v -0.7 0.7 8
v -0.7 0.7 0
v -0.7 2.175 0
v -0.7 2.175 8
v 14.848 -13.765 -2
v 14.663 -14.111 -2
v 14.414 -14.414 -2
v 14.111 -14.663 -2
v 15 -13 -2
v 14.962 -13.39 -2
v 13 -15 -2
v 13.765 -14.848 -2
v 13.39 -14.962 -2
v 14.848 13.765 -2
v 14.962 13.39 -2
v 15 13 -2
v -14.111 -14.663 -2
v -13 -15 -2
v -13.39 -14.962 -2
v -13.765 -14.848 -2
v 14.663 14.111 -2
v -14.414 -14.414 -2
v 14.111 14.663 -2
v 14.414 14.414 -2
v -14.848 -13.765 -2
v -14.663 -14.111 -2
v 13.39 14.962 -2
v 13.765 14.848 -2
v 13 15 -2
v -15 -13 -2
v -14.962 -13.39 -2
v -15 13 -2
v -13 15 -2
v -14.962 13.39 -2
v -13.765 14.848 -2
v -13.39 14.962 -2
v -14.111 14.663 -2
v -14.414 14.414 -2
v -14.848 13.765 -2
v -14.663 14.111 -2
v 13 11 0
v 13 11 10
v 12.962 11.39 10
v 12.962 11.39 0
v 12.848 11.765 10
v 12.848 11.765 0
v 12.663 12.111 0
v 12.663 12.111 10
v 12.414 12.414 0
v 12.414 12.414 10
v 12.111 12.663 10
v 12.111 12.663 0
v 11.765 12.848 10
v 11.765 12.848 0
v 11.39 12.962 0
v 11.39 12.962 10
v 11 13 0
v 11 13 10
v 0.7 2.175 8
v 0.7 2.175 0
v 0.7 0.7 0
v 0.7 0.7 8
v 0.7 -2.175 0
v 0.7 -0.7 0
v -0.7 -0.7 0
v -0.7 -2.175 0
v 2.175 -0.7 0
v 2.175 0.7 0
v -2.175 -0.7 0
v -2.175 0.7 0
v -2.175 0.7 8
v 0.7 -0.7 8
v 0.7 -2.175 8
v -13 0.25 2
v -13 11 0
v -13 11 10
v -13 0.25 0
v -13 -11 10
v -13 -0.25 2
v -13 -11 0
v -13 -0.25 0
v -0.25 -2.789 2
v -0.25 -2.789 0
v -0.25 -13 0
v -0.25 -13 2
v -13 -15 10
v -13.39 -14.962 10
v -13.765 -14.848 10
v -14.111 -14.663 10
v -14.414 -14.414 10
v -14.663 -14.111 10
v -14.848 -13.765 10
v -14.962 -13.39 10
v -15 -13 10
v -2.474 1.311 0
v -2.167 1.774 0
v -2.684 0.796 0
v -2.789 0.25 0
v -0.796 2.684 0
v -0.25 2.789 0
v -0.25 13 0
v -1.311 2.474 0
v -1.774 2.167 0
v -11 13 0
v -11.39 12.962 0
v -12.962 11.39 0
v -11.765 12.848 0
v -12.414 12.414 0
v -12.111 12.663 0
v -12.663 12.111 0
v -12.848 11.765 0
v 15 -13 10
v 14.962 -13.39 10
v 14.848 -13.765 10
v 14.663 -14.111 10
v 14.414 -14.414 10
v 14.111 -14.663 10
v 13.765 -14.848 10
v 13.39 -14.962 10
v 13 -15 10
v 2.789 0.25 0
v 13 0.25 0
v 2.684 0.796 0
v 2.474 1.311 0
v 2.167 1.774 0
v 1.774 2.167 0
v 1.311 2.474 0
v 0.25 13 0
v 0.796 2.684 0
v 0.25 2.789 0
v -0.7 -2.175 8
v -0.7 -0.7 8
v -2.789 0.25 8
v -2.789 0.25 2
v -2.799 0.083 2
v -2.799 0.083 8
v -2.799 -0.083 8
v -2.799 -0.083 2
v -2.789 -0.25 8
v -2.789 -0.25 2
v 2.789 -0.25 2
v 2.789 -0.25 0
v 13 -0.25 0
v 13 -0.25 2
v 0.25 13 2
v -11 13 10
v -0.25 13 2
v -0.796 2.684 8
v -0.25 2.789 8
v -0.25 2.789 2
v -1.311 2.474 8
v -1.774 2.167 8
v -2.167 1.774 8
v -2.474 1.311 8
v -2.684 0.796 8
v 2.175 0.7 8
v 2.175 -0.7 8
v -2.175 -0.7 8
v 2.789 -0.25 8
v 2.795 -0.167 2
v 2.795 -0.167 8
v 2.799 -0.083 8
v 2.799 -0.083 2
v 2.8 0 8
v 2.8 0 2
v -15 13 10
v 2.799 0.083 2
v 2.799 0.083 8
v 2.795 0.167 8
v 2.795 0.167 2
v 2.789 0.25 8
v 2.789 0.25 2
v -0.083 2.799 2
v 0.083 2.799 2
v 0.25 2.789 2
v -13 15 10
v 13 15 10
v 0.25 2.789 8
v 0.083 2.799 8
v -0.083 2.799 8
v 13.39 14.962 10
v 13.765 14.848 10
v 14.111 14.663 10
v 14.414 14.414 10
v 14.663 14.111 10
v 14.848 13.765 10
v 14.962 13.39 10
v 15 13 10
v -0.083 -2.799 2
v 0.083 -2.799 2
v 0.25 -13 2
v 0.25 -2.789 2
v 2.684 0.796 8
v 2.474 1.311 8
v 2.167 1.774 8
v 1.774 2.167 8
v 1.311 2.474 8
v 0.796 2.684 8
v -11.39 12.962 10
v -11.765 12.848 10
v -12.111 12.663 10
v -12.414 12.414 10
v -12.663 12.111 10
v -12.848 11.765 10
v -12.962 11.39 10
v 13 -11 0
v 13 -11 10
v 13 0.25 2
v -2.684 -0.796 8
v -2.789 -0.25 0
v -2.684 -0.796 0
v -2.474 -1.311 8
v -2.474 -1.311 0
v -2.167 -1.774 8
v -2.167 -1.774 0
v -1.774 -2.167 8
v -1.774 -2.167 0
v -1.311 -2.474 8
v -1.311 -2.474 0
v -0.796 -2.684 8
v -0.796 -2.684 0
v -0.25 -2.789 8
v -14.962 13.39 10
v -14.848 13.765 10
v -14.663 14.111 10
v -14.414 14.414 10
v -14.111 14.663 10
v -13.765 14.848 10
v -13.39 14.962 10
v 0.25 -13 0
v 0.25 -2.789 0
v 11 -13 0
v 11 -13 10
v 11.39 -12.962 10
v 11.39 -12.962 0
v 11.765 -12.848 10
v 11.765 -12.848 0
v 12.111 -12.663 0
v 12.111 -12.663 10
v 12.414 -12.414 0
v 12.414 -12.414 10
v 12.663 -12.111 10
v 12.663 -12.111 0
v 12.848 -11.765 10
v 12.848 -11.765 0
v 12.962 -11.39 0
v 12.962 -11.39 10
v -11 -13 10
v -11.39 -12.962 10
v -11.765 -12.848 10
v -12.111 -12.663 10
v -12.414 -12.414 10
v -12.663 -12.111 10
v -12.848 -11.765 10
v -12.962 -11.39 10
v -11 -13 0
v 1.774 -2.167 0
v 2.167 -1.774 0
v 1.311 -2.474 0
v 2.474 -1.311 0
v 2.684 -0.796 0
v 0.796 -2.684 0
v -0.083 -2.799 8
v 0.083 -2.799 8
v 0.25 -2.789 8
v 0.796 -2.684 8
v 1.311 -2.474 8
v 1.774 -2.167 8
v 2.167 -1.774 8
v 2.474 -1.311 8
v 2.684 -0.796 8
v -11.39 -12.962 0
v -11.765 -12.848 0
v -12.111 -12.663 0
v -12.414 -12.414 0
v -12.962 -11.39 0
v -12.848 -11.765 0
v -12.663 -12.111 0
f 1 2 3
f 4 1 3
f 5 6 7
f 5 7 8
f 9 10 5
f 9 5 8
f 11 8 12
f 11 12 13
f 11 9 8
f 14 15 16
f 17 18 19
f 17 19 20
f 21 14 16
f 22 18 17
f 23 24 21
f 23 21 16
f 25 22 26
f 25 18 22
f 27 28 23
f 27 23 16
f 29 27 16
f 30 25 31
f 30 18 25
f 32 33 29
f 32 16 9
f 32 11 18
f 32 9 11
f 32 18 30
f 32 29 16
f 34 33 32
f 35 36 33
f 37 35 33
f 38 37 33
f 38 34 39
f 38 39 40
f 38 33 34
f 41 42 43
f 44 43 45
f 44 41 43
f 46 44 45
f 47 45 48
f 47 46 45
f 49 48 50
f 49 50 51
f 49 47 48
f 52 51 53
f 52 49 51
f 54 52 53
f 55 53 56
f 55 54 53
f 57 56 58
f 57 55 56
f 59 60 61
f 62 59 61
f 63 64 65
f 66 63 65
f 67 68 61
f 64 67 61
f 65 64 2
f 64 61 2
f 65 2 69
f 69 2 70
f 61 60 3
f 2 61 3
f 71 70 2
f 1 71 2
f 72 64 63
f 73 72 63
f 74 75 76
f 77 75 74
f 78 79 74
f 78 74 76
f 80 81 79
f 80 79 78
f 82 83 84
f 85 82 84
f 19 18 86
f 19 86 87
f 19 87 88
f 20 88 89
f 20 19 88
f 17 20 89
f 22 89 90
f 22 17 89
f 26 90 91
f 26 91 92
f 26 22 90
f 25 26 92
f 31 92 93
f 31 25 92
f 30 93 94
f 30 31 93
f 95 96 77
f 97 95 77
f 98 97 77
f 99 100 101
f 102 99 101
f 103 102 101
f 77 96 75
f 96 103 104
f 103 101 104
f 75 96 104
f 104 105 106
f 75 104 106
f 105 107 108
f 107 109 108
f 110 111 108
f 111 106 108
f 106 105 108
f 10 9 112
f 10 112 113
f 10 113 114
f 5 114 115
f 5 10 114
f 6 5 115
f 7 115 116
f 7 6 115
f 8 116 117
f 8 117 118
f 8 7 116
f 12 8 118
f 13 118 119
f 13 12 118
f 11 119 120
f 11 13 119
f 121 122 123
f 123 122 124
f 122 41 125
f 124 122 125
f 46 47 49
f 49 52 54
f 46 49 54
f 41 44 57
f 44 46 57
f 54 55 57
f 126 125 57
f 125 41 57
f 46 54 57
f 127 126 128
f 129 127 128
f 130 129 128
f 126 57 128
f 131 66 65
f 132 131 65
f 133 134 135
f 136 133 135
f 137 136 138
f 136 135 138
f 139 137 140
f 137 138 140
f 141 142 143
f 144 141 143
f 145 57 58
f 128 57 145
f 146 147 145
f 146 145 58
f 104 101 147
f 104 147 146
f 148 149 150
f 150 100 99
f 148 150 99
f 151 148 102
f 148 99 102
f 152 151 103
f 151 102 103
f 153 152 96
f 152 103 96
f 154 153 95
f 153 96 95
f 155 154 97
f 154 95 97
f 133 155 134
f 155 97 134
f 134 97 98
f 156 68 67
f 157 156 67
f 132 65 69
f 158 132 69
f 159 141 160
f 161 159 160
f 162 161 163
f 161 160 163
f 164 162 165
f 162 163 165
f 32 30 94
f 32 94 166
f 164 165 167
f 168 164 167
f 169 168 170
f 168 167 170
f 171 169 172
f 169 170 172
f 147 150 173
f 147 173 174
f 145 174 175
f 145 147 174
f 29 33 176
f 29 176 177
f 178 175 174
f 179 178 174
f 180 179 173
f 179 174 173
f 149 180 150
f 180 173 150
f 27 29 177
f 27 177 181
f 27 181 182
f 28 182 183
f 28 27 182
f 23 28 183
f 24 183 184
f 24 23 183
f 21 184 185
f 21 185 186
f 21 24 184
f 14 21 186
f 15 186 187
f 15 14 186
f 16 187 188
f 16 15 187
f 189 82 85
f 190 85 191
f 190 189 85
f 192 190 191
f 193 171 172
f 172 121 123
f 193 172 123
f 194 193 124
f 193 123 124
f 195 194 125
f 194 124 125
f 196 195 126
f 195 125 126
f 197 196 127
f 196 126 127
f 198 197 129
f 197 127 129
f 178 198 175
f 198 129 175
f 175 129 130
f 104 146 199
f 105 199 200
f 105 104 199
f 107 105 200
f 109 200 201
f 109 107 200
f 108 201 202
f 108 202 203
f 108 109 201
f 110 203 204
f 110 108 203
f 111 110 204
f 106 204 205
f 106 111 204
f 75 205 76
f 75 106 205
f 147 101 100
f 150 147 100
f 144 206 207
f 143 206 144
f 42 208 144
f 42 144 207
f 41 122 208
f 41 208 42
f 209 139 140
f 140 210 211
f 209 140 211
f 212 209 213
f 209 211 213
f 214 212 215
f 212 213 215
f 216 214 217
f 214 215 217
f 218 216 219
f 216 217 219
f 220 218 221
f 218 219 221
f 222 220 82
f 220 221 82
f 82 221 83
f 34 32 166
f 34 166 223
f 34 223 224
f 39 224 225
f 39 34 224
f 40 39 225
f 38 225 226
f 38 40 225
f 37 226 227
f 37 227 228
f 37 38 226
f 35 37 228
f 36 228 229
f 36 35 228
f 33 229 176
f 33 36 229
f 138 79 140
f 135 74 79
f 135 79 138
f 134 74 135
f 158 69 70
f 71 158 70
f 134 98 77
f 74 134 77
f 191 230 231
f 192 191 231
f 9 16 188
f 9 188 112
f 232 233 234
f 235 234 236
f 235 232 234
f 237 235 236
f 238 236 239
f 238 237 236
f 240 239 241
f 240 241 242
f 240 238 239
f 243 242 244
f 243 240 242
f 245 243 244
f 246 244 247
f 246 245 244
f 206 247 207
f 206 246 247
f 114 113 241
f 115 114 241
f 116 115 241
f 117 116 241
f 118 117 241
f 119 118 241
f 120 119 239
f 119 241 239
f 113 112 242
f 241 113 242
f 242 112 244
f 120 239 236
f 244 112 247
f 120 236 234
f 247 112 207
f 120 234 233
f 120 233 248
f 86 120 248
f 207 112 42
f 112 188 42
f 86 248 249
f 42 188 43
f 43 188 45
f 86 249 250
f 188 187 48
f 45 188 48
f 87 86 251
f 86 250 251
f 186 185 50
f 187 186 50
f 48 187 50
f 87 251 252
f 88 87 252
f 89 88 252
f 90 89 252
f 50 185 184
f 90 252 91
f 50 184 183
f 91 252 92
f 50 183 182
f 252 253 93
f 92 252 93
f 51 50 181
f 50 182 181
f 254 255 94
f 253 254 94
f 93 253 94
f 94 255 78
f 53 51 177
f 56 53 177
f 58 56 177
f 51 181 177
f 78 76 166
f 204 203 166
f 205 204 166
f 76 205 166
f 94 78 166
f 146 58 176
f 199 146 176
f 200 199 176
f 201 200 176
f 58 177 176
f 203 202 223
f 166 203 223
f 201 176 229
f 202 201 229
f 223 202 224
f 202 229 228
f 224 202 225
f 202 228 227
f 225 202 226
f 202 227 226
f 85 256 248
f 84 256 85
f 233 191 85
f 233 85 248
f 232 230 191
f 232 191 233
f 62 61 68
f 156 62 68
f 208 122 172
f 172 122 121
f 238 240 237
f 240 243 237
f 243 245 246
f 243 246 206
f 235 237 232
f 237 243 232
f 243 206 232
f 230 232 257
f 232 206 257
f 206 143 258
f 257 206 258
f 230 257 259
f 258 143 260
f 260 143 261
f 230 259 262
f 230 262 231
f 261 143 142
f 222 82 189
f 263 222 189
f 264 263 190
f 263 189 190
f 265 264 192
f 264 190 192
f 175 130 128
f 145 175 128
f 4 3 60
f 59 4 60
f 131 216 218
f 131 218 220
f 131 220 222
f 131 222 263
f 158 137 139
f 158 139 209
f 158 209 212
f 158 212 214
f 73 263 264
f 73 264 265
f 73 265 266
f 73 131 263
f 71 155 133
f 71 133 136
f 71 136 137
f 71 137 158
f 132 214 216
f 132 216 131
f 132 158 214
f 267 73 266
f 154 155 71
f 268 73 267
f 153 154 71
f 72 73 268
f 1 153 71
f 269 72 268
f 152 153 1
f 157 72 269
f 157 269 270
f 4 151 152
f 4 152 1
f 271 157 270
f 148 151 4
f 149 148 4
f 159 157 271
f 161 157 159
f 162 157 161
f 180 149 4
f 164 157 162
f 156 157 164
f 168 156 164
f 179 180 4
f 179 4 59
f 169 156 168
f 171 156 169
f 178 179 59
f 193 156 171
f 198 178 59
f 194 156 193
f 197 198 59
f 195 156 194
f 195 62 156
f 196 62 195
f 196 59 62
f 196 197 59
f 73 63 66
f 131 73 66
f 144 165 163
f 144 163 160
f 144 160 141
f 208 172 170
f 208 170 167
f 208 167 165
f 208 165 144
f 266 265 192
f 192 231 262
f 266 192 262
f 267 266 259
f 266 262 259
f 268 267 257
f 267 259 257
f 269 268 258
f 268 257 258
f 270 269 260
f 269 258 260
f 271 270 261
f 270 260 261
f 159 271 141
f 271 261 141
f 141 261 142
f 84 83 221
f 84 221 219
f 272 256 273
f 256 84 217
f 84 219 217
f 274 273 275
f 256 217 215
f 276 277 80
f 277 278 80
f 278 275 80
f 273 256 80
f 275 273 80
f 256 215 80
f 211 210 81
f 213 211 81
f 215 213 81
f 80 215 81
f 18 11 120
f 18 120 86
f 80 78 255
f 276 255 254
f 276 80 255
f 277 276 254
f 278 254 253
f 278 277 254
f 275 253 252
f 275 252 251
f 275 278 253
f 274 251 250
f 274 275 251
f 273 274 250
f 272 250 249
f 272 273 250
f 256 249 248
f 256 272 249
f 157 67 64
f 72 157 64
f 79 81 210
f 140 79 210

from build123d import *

# Parameters (mm, degrees)
EXTRUDE_1_DEPTH = 10
EXTRUDE_2_DEPTH = 8
EXTRUDE_START   = -2
EXTRUDE_3_DEPTH = 2
EXTRUDE_4_DEPTH = 2


with BuildPart() as part:
    # 草图1 → 凸台-拉伸1 (new body)
    with BuildSketch(Plane.XY):
        with BuildLine():
            Line((13, 15), (-13, 15))
            ThreePointArc((-13, 15), (-14.414213562, 14.414213562), (-15, 13))
            Line((-15, 13), (-15, -13))
            ThreePointArc((-15, -13), (-14.414213562, -14.414213562), (-13, -15))
            Line((-13, -15), (13, -15))
            ThreePointArc((13, -15), (14.414213562, -14.414213562), (15, -13))
            Line((15, -13), (15, 13))
            ThreePointArc((15, 13), (14.414213562, 14.414213562), (13, 15))
        make_face()
        with BuildLine():
            ThreePointArc((-13, 11), (-12.414213562, 12.414213562), (-11, 13))
            Line((-11, 13), (-0.25, 13))
            Line((-0.25, 13), (0.25, 13))
            Line((0.25, 13), (11, 13))
            ThreePointArc((11, 13), (12.414213562, 12.414213562), (13, 11))
            Line((13, 11), (13, 0.25))
            Line((13, 0.25), (13, -0.25))
            Line((13, -0.25), (13, -11))
            ThreePointArc((13, -11), (12.414213562, -12.414213562), (11, -13))
            Line((11, -13), (0.25, -13))
            Line((0.25, -13), (-0.25, -13))
            Line((-0.25, -13), (-11, -13))
            ThreePointArc((-11, -13), (-12.414213562, -12.414213562), (-13, -11))
            Line((-13, -11), (-13, -0.25))
            Line((-13, -0.25), (-13, 0.25))
            Line((-13, 0.25), (-13, 11))
        make_face(mode=Mode.SUBTRACT)
    extrude(amount=EXTRUDE_1_DEPTH)



with BuildPart() as body_2:
    # 草图1<6> → 凸台-拉伸2 (new body)
    with BuildSketch(Plane.XY):
        with BuildLine():
            ThreePointArc((0.25, 2.788816953), (0, 2.8), (-0.25, 2.788816953))
            ThreePointArc((-0.25, 2.788816953), (-1.979898987, 1.979898987), (-2.788816953, 0.25))
            ThreePointArc((-2.788816953, 0.25), (-2.8, 0), (-2.788816953, -0.25))
            ThreePointArc((-2.788816953, -0.25), (-1.979898987, -1.979898987), (-0.25, -2.788816953))
            ThreePointArc((-0.25, -2.788816953), (0, -2.8), (0.25, -2.788816953))
            ThreePointArc((0.25, -2.788816953), (1.979898987, -1.979898987), (2.788816953, -0.25))
            ThreePointArc((2.788816953, -0.25), (2.797202841, -0.125124998), (2.8, 0))
            ThreePointArc((2.8, 0), (2.797202841, 0.125124998), (2.788816953, 0.25))
            ThreePointArc((2.788816953, 0.25), (1.979898987, 1.979898987), (0.25, 2.788816953))
        make_face()
        Polygon((-2.175, -0.7), (-2.175, 0.7), (-0.7, 0.7), (-0.7, 2.175), (0.7, 2.175), (0.7, 0.7), (2.175, 0.7), (2.175, -0.7), (0.7, -0.7), (0.7, -2.175), (-0.7, -2.175), (-0.7, -0.7), align=None, mode=Mode.SUBTRACT)
    extrude(amount=EXTRUDE_2_DEPTH)


with BuildPart() as part_1:
    add(part.part)

    add(body_2.part)  # 凸台-拉伸3 merges body 2
    # 草图1<7> → 凸台-拉伸3 (add)
    with BuildSketch(Plane.XY.offset(EXTRUDE_START)):
        with BuildLine():
            Line((-13, 15), (13, 15))
            ThreePointArc((13, 15), (14.414213562, 14.414213562), (15, 13))
            Line((15, 13), (15, -13))
            ThreePointArc((15, -13), (14.414213562, -14.414213562), (13, -15))
            Line((13, -15), (-13, -15))
            ThreePointArc((-13, -15), (-14.414213562, -14.414213562), (-15, -13))
            Line((-15, -13), (-15, 13))
            ThreePointArc((-15, 13), (-14.414213562, 14.414213562), (-13, 15))
        make_face()
    extrude(amount=EXTRUDE_3_DEPTH)

    # 草图1<9> → 凸台-拉伸4 (add)
    with BuildSketch(Plane.XY):
        with BuildLine():
            Line((0.25, 13), (-0.25, 13))
            Line((-0.25, 13), (-0.25, 2.788816953))
            ThreePointArc((-0.25, 2.788816953), (0, 2.8), (0.25, 2.788816953))
            Line((0.25, 2.788816953), (0.25, 13))
        make_face()
        with BuildLine():
            Line((-2.788816953, 0.25), (-13, 0.25))
            Line((-13, 0.25), (-13, -0.25))
            Line((-13, -0.25), (-2.788816953, -0.25))
            ThreePointArc((-2.788816953, -0.25), (-2.8, 0), (-2.788816953, 0.25))
        make_face()
        with BuildLine():
            Line((13, 0.25), (2.788816953, 0.25))
            ThreePointArc((2.788816953, 0.25), (2.8, 0), (2.788816953, -0.25))
            Line((2.788816953, -0.25), (13, -0.25))
            Line((13, -0.25), (13, 0.25))
        make_face()
        with BuildLine():
            ThreePointArc((0.25, -2.788816953), (0, -2.8), (-0.25, -2.788816953))
            Line((-0.25, -2.788816953), (-0.25, -13))
            Line((-0.25, -13), (0.25, -13))
            Line((0.25, -13), (0.25, -2.788816953))
        make_face()
    extrude(amount=EXTRUDE_4_DEPTH)


solid = part_1.part
